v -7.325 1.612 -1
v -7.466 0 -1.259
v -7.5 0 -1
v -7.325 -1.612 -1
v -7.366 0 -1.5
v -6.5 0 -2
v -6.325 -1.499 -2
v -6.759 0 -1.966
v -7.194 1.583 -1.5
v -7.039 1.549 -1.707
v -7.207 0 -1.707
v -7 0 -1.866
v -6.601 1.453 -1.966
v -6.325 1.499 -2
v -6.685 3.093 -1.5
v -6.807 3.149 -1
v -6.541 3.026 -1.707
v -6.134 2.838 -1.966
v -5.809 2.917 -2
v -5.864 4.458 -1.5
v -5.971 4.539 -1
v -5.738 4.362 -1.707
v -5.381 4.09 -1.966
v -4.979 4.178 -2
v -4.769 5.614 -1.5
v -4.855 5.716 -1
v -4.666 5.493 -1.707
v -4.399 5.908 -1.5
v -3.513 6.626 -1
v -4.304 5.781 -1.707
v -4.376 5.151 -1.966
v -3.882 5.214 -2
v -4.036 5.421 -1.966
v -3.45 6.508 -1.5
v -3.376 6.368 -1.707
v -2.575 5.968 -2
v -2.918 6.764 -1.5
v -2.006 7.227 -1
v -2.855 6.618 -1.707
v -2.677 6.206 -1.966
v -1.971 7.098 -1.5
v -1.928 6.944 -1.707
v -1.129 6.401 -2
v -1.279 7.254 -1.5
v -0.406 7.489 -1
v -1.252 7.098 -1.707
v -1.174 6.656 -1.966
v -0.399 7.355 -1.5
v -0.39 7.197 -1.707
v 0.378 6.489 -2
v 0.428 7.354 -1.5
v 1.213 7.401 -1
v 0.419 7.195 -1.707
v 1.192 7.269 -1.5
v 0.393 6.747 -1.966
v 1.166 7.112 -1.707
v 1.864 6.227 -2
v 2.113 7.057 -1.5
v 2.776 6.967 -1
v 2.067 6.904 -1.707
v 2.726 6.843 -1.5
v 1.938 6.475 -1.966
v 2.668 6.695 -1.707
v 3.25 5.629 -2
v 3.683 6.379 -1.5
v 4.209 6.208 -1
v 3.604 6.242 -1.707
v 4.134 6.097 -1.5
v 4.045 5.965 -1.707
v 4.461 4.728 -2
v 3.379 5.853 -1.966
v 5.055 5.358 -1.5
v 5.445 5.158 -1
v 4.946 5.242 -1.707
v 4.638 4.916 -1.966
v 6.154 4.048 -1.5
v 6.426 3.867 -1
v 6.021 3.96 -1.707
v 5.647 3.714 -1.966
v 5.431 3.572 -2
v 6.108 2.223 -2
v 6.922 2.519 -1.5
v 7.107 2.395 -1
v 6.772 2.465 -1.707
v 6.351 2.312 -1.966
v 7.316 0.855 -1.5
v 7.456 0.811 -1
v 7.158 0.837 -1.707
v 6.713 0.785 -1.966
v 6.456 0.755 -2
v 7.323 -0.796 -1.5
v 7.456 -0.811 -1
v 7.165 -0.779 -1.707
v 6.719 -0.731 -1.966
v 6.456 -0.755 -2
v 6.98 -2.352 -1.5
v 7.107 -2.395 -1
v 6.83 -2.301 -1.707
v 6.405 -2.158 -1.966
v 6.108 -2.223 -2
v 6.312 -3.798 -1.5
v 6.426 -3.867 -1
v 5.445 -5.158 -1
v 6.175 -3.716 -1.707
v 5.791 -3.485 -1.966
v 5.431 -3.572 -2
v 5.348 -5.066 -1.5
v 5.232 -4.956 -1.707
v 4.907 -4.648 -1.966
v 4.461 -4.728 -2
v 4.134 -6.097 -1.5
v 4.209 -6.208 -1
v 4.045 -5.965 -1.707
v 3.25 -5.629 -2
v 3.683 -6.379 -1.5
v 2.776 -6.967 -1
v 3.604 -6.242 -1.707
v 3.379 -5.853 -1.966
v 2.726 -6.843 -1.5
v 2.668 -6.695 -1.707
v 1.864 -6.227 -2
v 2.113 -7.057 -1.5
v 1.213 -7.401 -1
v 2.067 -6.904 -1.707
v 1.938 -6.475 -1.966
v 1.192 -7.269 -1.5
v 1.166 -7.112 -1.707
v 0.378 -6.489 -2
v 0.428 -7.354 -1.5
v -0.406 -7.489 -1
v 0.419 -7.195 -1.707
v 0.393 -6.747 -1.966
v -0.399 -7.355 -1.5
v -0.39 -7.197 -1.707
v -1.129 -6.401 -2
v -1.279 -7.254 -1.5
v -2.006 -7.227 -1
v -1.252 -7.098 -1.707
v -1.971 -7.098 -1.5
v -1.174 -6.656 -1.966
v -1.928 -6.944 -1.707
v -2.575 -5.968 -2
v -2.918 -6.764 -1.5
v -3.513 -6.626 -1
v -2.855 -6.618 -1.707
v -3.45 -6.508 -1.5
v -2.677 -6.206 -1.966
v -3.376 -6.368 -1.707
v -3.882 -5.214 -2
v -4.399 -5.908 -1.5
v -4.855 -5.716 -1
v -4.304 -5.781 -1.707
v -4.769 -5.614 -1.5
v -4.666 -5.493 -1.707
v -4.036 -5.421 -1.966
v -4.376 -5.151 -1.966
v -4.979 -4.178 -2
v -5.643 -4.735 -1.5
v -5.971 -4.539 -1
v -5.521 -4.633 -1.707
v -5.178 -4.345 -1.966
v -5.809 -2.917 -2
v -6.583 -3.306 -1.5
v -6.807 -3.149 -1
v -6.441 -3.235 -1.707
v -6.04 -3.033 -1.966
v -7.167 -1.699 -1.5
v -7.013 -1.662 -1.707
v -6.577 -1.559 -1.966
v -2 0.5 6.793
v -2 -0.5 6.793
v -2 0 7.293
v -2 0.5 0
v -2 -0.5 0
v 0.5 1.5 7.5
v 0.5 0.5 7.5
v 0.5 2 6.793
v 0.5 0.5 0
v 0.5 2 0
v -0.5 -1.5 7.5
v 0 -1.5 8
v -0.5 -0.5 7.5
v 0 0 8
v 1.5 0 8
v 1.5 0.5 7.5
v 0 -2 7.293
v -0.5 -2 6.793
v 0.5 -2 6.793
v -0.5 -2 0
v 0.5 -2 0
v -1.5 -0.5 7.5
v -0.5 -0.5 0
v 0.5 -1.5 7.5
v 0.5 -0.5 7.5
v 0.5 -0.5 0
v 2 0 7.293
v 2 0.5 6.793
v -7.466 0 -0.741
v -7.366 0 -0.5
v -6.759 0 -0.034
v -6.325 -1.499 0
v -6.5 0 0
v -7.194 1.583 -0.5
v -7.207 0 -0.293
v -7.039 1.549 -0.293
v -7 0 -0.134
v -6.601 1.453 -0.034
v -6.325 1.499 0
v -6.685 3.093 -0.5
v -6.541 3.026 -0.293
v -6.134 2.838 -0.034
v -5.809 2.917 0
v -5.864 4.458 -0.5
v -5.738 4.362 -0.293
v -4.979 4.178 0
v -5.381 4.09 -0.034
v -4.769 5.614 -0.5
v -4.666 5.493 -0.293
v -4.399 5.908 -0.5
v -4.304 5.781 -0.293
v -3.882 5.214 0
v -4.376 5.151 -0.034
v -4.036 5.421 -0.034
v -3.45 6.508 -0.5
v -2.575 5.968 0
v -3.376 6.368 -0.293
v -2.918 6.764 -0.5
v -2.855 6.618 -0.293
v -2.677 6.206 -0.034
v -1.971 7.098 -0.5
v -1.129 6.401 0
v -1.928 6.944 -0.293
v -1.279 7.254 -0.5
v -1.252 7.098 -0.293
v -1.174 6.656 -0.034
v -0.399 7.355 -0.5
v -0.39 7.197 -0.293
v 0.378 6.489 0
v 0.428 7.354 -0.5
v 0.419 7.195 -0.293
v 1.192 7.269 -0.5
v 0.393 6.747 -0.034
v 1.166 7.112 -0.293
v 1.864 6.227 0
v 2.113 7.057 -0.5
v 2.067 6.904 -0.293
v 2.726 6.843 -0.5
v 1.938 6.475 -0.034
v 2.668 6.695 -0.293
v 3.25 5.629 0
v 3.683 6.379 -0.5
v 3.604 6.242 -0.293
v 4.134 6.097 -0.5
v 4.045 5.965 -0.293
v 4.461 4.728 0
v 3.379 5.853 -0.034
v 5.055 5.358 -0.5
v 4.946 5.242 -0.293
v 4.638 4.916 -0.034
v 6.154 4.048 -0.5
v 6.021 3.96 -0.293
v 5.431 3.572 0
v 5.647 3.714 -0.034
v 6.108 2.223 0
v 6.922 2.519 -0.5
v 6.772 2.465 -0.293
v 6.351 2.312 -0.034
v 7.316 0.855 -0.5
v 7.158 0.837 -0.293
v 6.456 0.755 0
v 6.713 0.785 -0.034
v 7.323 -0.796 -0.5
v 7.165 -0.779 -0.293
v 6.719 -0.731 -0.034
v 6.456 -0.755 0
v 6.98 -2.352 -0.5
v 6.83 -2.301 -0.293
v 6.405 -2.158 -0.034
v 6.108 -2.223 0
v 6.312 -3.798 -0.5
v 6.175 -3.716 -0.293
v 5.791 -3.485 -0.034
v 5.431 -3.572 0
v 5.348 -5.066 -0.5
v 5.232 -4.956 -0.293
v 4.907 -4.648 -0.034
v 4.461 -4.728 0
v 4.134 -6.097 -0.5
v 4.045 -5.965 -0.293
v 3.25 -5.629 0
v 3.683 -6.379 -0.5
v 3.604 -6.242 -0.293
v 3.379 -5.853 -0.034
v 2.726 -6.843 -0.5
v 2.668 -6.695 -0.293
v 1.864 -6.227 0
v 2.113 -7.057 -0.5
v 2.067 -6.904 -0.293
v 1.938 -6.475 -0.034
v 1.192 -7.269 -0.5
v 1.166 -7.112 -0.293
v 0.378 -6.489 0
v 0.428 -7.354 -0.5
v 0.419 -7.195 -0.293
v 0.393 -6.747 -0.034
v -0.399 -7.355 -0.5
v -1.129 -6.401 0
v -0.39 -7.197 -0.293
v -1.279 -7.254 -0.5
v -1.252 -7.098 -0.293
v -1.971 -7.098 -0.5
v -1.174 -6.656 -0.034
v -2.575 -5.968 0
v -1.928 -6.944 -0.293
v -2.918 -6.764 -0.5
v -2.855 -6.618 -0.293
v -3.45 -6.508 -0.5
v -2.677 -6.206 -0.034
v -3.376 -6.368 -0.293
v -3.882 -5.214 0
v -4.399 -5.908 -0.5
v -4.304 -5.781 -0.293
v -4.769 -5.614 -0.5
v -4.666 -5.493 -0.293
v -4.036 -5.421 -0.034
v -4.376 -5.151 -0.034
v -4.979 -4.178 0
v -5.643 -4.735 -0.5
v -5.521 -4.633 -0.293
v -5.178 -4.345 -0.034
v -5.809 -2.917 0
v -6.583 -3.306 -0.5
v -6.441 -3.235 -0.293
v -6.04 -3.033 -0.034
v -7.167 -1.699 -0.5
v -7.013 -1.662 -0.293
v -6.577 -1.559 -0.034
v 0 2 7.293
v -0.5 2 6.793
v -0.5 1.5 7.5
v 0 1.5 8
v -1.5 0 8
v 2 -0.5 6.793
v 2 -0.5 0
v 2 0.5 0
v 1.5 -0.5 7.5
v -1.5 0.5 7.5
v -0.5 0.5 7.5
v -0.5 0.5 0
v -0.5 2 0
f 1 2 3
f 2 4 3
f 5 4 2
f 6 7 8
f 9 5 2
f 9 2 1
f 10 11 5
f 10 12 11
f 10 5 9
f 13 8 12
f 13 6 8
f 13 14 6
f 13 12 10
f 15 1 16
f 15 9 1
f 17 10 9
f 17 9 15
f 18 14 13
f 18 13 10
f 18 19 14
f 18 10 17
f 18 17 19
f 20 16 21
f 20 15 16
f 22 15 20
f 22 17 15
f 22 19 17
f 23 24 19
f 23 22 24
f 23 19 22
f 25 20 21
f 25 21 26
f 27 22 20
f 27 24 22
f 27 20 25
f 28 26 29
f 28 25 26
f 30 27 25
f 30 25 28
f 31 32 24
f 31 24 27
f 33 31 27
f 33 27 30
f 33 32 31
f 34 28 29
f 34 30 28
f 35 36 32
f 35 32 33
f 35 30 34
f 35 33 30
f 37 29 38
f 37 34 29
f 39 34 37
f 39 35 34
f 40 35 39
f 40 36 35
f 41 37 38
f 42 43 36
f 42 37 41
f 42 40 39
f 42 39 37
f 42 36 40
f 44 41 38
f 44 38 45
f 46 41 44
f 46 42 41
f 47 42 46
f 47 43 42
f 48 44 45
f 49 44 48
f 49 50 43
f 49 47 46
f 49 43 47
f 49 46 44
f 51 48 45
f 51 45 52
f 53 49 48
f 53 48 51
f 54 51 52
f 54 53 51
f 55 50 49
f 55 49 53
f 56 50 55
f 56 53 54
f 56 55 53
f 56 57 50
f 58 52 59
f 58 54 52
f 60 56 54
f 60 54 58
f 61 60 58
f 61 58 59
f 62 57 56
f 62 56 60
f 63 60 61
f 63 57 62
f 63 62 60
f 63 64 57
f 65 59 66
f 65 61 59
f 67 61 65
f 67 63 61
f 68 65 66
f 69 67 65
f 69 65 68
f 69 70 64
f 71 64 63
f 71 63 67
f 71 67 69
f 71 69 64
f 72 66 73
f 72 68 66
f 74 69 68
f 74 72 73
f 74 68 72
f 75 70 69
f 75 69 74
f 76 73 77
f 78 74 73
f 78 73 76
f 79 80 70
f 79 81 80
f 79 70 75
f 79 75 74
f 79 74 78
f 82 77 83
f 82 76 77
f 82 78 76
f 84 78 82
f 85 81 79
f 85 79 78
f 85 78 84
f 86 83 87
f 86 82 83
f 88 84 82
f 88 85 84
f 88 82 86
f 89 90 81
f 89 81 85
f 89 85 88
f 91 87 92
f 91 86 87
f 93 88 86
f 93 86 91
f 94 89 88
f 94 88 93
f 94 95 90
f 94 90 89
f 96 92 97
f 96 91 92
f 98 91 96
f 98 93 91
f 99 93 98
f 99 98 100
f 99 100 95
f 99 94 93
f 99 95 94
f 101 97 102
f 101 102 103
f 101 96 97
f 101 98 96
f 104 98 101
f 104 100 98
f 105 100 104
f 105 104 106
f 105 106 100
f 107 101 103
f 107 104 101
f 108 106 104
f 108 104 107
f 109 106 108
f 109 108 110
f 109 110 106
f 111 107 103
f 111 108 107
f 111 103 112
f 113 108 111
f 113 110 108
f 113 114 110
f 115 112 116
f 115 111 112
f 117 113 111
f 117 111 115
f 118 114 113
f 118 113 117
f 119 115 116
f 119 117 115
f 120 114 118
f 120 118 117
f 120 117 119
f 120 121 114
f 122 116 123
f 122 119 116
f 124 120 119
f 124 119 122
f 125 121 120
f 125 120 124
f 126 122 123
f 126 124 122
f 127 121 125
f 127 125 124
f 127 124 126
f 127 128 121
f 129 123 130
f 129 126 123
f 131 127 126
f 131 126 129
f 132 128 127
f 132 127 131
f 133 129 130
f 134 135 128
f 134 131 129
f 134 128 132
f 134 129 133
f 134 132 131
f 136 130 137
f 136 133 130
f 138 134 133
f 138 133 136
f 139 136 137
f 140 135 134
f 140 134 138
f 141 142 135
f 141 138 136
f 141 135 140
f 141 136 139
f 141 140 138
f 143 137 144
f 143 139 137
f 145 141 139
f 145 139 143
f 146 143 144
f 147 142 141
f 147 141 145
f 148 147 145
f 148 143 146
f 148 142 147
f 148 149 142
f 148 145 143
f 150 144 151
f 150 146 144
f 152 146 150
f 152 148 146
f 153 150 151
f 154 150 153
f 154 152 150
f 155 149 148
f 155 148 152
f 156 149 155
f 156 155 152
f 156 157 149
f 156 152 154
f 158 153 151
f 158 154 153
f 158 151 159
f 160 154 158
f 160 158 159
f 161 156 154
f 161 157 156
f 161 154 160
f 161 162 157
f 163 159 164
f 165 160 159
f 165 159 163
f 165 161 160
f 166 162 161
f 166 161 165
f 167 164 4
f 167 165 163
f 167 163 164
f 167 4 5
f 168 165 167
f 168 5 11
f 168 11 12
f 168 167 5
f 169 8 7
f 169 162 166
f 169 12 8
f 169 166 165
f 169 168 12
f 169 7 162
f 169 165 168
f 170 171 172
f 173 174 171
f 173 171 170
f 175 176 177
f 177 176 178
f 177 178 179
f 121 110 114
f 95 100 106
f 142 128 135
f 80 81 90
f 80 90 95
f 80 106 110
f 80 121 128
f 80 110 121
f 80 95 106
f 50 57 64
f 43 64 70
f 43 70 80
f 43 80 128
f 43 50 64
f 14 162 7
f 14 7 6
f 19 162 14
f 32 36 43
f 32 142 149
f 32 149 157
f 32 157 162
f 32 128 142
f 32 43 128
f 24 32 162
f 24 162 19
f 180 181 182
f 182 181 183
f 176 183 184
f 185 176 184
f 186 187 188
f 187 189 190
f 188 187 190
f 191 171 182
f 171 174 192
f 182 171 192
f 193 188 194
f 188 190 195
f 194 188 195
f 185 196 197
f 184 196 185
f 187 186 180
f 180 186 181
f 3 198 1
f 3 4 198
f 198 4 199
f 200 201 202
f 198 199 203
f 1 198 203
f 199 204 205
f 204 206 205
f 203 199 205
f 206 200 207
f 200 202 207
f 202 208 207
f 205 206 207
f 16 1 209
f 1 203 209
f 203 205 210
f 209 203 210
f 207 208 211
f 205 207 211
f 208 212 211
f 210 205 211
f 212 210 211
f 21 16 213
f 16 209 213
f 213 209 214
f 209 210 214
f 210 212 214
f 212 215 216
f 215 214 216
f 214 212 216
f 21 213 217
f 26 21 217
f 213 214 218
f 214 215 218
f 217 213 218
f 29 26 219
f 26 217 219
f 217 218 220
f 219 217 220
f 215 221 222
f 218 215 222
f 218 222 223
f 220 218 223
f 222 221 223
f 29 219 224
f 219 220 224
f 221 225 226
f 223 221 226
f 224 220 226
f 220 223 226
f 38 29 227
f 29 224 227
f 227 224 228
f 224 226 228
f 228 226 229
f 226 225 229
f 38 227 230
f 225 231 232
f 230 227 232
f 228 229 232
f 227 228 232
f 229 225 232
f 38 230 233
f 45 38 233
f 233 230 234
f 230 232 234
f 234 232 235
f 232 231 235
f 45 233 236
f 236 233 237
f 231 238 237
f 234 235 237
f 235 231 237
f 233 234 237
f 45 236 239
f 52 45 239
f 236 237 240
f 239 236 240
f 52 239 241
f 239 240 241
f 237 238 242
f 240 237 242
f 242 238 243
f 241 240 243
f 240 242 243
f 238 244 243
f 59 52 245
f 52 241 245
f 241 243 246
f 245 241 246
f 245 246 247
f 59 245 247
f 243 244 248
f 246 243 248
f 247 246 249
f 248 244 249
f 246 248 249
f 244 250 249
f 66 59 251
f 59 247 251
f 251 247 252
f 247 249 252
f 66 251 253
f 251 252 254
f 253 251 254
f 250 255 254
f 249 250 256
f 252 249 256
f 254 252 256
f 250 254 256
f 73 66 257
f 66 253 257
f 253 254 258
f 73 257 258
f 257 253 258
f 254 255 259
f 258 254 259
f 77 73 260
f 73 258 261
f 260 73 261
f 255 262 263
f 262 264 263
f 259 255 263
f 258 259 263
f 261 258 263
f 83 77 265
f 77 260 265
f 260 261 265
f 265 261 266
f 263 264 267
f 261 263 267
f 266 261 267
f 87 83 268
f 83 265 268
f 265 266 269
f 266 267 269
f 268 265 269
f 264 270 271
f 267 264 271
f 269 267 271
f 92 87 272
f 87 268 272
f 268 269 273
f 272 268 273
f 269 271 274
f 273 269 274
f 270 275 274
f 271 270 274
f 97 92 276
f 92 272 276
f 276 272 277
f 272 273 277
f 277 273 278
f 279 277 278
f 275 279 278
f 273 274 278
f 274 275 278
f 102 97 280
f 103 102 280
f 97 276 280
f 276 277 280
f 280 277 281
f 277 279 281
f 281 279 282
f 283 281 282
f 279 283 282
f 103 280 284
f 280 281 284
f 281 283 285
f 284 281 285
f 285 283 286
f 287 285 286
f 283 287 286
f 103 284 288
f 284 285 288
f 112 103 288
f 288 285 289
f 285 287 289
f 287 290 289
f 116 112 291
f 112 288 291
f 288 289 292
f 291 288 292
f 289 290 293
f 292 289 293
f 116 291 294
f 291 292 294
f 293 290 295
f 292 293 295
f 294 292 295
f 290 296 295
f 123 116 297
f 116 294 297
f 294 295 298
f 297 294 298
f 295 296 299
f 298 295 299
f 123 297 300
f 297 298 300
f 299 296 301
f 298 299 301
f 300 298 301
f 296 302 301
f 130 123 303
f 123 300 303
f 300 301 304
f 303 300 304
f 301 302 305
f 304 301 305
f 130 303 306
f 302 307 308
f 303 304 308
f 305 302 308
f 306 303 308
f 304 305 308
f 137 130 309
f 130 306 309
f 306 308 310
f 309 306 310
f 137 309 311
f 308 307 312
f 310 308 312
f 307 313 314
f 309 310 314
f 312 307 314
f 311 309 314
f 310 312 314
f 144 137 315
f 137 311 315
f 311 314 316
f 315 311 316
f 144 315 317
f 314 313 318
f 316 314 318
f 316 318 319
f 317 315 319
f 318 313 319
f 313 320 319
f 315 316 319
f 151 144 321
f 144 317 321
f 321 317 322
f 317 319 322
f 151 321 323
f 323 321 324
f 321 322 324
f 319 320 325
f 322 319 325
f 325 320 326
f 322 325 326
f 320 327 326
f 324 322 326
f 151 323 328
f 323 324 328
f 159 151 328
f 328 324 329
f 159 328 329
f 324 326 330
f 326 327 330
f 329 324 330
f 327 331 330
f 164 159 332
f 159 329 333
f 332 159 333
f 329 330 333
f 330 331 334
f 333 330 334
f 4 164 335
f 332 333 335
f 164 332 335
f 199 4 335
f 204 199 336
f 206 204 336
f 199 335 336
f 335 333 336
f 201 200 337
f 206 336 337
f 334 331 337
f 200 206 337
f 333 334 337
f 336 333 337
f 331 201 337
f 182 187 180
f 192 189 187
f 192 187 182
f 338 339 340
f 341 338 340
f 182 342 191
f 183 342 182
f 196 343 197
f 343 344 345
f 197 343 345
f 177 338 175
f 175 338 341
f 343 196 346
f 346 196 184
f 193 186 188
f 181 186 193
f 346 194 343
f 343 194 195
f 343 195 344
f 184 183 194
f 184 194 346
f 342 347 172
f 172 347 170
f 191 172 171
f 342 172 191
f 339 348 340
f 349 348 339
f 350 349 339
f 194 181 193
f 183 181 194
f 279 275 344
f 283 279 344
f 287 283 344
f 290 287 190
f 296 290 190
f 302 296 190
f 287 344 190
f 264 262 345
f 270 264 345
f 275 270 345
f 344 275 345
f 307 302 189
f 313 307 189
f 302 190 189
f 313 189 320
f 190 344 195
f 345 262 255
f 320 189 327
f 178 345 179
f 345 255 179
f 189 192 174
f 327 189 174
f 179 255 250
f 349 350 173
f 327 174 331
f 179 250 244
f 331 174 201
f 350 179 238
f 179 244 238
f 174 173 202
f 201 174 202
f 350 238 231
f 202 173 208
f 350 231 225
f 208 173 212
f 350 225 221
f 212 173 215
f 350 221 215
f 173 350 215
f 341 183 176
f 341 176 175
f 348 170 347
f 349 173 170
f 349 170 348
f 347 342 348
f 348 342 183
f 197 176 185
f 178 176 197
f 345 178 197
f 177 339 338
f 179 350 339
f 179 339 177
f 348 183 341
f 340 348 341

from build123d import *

# Parameters (mm, degrees)
SKETCH_1_W      = 4
SKETCH_1_H      = 1
SKETCH_1_W_2    = 1
SKETCH_1_H_2    = 4
EXTRUDE_1_DEPTH = 8
CHAMFER_1_SIZE  = 0.5
CHAMFER_2_SIZE  = 0.5
SKETCH_2_R      = 7.5
EXTRUDE_2_DEPTH = 2
FILLET_1_R      = 1


# Some blends are built 0.0001 mm under size
with BuildPart() as part:
    # 草图1 → 凸台-拉伸1 (new body)
    with BuildSketch(Plane.XY):
        Rectangle(SKETCH_1_W, SKETCH_1_H)
        Rectangle(SKETCH_1_W_2, SKETCH_1_H_2)
    extrude(amount=EXTRUDE_1_DEPTH)

    # 倒角1
    chamfer_1_edges = [part.edges().sort_by_distance(p)[0] for p in [
        (-1.25, -0.5, 8),
        (-0.5, -1.25, 8),
        (0.5, -1.25, 8),
        (1.25, -0.5, 8),
        (-1.25, 0.5, 8),
        (-0.5, 1.25, 8),
        (1.25, 0.5, 8),
        (0.5, 1.25, 8),
    ]]
    chamfer(chamfer_1_edges, length=CHAMFER_1_SIZE - 0.0001)  # a hair under: the kernel refuses the full size

    # 倒角2
    # the kernel refuses this chamfer: 0.5 mm, written as the material it takes off along each edge
    with BuildSketch(Plane(origin=(-2, 1.40922724, 6.59087276), x_dir=(0.9996219169112968, 0.01944252080601401, 0.019442520806014003), z_dir=(0, -0.7071067811865474, 0.7071067811865477)), Plane(origin=(0.90912724, -2, 8.90922724), x_dir=(0.7068394360706737, -0.02749587661058652, -0.7068394360706732), z_dir=(-0.7071067811865474, 0, -0.7071067811865477)), Plane(origin=(2, 0.90912724, 8.90922724), x_dir=(0.027495876610586514, 0.7068394360706736, -0.7068394360706733), z_dir=(0, -0.7071067811865474, -0.7071067811865477)), Plane(origin=(-0.90912724, 2, 8.90922724), x_dir=(-0.7068394360706737, 0.02749587661058652, -0.7068394360706732), z_dir=(0.7071067811865474, 0, -0.7071067811865477)), Plane(origin=(-1.40922724, 2, 6.59087276), x_dir=(0.7068394360706737, 0.027495876610586494, -0.7068394360706733), z_dir=(0.7071067811865474, 0, 0.7071067811865477))) as chamfer_2_piece_1:
        Polygon((CHAMFER_2_SIZE * 0.999621916911, -CHAMFER_2_SIZE * 0.0274958766106), (-CHAMFER_2_SIZE * 0.0274958766106, -CHAMFER_2_SIZE * 0.999621916911), (0, 0), align=None)
    extrude(amount=3.278648348, mode=Mode.SUBTRACT)
    with BuildSketch(Plane(origin=(-2, 0.90912724, 8.90922724), x_dir=(-0.027495876610586514, 0.7068394360706736, -0.7068394360706733), z_dir=(0, -0.7071067811865474, -0.7071067811865477)), Plane(origin=(-0.90912724, -2, 8.90922724), x_dir=(-0.7068394360706737, -0.02749587661058652, -0.7068394360706732), z_dir=(0.7071067811865474, 0, -0.7071067811865477)), Plane(origin=(2, -0.90912724, 8.90922724), x_dir=(0.027495876610586514, -0.7068394360706736, -0.7068394360706733), z_dir=(0, 0.7071067811865474, -0.7071067811865477))) as chamfer_2_piece_2:
        Polygon((CHAMFER_2_SIZE * 0.999621916911, CHAMFER_2_SIZE * 0.0274958766106), (-CHAMFER_2_SIZE * 0.0274958766106, CHAMFER_2_SIZE * 0.999621916911), (0, 0), align=None)
    extrude(amount=3.278648348, mode=Mode.SUBTRACT)

    # 草图2 → 凸台-拉伸2 (add)
    with BuildSketch(Plane(origin=(0, 0, 0), x_dir=(-1, 0, 0), z_dir=(0, 0, -1))):
        Circle(SKETCH_2_R)
    extrude(amount=EXTRUDE_2_DEPTH)

    # 圆角1
    fillet_1_edges = [part.edges().sort_by_distance(p)[0] for p in [
        (7.5, 0, 0),
        (7.5, 0, -2),
    ]]
    fillet(fillet_1_edges, radius=FILLET_1_R - 0.0001)  # a hair under: the kernel refuses the full size


solid = part.part
